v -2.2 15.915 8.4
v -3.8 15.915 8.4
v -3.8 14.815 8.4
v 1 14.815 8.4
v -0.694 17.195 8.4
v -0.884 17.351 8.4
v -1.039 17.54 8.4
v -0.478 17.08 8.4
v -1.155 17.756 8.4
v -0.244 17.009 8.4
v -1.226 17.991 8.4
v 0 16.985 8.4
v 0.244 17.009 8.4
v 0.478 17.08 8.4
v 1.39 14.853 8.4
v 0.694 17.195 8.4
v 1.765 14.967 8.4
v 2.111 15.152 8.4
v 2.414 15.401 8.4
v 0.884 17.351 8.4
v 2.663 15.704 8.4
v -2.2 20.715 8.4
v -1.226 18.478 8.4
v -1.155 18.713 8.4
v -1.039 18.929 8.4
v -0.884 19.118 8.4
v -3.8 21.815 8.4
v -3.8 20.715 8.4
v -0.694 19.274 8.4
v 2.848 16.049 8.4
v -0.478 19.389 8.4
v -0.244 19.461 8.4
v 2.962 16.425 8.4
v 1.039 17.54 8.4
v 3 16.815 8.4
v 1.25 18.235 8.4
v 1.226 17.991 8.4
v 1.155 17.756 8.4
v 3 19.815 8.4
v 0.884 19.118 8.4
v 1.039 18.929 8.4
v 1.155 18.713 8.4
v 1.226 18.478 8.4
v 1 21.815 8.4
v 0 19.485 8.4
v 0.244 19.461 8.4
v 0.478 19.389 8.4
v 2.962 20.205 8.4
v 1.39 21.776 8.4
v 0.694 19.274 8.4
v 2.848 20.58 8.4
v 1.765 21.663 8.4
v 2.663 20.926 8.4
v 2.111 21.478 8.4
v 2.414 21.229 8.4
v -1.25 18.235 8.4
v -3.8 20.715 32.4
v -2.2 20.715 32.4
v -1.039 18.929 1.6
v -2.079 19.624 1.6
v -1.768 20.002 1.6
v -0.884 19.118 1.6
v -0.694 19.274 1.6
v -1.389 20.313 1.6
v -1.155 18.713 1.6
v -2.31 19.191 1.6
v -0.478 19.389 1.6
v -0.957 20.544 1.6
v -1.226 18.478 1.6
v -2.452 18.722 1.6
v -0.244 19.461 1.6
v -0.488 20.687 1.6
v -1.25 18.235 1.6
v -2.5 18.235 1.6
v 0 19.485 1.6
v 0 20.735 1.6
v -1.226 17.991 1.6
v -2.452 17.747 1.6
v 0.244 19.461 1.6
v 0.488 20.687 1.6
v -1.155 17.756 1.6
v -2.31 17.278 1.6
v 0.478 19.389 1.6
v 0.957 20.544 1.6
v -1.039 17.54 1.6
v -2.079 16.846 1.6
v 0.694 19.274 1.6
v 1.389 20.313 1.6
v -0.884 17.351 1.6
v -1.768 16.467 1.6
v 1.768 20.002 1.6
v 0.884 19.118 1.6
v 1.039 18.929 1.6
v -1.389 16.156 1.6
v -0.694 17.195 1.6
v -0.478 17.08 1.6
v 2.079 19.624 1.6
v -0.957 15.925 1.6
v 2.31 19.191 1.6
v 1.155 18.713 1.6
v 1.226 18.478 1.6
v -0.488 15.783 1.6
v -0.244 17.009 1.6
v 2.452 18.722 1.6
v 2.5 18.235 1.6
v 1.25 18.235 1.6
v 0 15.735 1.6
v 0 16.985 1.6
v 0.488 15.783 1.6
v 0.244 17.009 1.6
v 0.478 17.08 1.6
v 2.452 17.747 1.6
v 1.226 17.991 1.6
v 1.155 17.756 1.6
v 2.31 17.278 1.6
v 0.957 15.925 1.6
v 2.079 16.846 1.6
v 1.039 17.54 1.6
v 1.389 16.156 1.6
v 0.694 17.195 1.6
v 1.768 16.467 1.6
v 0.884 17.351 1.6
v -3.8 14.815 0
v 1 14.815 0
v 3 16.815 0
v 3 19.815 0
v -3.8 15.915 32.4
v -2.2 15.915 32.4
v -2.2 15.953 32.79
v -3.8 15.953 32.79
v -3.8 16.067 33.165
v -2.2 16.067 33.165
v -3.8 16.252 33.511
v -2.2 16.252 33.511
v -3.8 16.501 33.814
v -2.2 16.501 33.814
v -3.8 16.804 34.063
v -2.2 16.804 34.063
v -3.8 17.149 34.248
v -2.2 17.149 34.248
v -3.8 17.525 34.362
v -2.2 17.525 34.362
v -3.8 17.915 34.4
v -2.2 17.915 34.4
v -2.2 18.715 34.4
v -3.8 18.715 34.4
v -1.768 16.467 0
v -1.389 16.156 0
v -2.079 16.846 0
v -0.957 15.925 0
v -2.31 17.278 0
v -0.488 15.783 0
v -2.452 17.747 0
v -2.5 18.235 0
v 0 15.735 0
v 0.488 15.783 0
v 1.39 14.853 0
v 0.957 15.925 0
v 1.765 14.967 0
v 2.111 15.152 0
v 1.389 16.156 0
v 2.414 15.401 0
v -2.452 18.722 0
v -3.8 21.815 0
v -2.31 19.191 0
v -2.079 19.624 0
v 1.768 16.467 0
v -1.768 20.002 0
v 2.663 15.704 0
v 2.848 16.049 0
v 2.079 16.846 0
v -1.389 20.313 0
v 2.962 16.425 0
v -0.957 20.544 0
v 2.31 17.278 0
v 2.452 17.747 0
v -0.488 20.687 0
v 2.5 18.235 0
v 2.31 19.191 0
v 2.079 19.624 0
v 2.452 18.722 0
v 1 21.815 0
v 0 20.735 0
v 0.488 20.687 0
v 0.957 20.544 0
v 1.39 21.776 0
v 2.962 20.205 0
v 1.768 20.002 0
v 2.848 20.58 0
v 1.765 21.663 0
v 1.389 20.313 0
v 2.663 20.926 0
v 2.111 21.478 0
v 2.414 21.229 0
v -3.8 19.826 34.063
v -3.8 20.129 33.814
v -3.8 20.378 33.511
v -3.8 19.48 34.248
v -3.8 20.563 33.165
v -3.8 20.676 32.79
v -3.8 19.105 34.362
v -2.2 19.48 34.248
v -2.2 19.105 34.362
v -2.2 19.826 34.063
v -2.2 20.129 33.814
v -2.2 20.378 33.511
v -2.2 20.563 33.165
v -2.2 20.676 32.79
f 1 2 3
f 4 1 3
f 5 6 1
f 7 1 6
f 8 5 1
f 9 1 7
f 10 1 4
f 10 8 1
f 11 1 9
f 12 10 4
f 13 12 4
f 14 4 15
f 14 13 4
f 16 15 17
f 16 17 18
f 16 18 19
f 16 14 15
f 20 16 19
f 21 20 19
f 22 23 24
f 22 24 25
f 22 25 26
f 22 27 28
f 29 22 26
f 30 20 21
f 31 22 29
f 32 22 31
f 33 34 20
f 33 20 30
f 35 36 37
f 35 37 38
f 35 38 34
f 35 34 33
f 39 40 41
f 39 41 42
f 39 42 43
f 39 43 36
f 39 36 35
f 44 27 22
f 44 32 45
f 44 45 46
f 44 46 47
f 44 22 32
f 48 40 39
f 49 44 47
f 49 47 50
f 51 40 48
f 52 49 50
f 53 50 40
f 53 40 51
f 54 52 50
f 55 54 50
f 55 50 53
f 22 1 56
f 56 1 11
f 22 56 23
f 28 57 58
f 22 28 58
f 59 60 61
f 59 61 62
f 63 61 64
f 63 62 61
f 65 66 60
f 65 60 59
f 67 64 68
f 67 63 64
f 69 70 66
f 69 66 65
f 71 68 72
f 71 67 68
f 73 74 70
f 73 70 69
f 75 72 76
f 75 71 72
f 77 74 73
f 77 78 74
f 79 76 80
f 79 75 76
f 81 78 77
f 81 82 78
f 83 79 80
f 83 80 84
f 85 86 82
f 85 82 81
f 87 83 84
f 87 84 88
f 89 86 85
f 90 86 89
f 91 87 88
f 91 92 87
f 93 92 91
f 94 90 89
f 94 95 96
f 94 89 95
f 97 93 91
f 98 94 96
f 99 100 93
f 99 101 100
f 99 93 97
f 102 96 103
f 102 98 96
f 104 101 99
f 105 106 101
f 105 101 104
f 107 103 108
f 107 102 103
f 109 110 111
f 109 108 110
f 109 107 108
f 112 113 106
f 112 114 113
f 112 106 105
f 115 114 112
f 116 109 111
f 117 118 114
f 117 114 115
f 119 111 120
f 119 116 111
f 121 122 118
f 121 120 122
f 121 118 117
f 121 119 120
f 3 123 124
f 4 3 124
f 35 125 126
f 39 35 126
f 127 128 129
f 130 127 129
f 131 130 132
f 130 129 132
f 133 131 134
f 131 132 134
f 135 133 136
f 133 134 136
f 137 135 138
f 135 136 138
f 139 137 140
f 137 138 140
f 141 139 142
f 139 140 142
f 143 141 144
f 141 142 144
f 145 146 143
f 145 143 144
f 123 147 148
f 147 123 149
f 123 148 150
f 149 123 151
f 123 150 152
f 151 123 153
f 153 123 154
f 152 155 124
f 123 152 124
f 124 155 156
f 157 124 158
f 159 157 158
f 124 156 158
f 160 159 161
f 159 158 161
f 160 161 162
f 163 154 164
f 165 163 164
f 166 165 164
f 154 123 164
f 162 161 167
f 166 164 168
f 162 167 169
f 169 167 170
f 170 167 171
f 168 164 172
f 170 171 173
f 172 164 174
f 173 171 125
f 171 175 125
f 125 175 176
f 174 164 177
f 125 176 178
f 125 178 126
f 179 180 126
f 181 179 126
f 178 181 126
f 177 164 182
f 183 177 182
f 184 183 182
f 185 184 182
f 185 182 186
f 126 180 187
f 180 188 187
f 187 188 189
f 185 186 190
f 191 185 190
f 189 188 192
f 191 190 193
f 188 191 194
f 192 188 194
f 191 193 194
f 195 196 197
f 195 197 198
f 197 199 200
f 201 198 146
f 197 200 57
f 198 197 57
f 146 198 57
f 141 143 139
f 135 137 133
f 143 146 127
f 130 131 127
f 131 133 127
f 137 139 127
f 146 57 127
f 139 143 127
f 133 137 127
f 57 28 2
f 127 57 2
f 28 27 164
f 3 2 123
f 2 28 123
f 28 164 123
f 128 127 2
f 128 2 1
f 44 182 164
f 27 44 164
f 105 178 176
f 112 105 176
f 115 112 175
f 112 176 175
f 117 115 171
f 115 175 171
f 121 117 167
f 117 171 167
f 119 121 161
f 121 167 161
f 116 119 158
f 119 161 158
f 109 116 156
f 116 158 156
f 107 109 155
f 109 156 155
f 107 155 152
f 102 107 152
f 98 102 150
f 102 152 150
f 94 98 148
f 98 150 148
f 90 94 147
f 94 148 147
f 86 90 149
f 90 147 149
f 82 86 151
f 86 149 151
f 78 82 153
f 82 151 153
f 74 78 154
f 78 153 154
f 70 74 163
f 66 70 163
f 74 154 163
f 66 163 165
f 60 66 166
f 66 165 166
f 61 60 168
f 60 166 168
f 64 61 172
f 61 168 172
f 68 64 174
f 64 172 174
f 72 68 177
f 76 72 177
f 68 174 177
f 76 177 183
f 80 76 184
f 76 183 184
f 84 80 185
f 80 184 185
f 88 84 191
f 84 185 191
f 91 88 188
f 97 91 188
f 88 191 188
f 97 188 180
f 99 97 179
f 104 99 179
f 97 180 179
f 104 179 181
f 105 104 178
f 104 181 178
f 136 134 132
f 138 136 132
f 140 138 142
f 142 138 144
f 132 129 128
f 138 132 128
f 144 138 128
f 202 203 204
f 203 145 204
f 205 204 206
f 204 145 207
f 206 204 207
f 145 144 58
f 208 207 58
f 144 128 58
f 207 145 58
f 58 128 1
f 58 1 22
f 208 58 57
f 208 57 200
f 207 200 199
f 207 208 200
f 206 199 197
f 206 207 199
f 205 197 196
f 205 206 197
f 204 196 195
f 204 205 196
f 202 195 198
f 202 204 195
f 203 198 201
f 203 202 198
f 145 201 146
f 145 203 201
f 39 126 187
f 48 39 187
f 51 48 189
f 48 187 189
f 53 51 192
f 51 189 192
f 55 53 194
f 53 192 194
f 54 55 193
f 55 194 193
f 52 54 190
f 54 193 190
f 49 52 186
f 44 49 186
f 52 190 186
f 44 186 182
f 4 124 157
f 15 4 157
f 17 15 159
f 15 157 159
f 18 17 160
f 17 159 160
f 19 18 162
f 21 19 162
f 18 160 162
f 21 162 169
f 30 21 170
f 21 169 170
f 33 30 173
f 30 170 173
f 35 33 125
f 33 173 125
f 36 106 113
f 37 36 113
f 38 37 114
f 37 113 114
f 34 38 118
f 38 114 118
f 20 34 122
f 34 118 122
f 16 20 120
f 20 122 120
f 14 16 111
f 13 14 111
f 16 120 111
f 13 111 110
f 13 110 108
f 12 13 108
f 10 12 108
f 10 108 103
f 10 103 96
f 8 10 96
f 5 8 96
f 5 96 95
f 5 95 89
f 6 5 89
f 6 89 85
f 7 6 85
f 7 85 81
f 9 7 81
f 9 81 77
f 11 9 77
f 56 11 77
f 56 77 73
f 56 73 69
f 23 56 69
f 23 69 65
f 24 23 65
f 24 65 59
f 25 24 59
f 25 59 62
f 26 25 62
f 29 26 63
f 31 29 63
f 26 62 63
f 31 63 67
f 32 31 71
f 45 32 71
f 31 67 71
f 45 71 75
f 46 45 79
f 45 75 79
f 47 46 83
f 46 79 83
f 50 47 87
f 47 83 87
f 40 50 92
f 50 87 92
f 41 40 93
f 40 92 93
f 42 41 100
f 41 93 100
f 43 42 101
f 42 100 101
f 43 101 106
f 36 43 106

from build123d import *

# Parameters (mm, degrees)
F1_DEPTH  = 8.4
F2_R      = 2.5
F3_DEPTH  = 1.6
F4_R      = 1.25
F5_DEPTH  = 10
F6_W      = 2
F6_H      = 4.8
F7_DEPTH  = 26
F8_R      = 2
F9_DEPTH  = 0.2
F10_DEPTH = 0.2


# Not quite as in the source:
# - a feature names something its author has since deleted; it is built from what else it names


with BuildPart() as f1:
    # F0 (on Top) → F1 (new body)
    with BuildSketch(Plane.XY):
        with BuildLine():
            Line((1, 21.8148477226), (-4, 21.8148477226))
            Line((-4, 21.8148477226), (-4, 14.8148477226))
            Line((-4, 14.8148477226), (1, 14.8148477226))
            ThreePointArc((1, 14.8148477226), (2.4142135624, 15.4006341603), (3, 16.8148477226))
            Line((3, 16.8148477226), (3, 19.8148477226))
            ThreePointArc((3, 19.8148477226), (2.4142135624, 21.229061285), (1, 21.8148477226))
        make_face()
    extrude(amount=F1_DEPTH)

    # F2 (on face) → F3 (cut)
    with BuildSketch(Plane(origin=(0, 0, 0), x_dir=(1, 0, 0), z_dir=(0, 0, -1))):
        with Locations((0, -18.2346012443)):
            Circle(F2_R)
    extrude(amount=-F3_DEPTH, mode=Mode.SUBTRACT)

    # F4 (on face) → F5 (cut)
    with BuildSketch(Plane(origin=(0, 0, 1.6), x_dir=(1, 0, 0), z_dir=(0, 0, -1))):
        with Locations((0, -18.2346012443)):
            Circle(F4_R)
    extrude(amount=-F5_DEPTH, mode=Mode.SUBTRACT)

    # F6 (on face) → F7 (join)
    with BuildSketch(Plane.XY.offset(8.4)):
        with Locations((-3, 18.3148477226)):
            Rectangle(F6_W, F6_H)
    extrude(amount=F7_DEPTH)

    # F8
    f8_edges = [f1.edges().sort_by_distance(p)[0] for p in [
        (-3, 20.714848, 34.4),
        (-3, 15.914848, 34.4),
    ]]
    fillet(f8_edges, radius=F8_R)

    # F9 (cut): a face of the model
    f9_faces = [f1.faces().sort_by_distance(p)[0] for p in [
        (-2, 18.3148477226, 21.2249019293),
    ]]
    extrude(f9_faces, amount=-F9_DEPTH, mode=Mode.SUBTRACT)

    # F10 (cut): a face of the model
    f10_faces = [f1.faces().sort_by_distance(p)[0] for p in [
        (-4, 18.3148477226, 15.72101639),
    ]]
    extrude(f10_faces, amount=-F10_DEPTH, mode=Mode.SUBTRACT)


solid = f1.part
